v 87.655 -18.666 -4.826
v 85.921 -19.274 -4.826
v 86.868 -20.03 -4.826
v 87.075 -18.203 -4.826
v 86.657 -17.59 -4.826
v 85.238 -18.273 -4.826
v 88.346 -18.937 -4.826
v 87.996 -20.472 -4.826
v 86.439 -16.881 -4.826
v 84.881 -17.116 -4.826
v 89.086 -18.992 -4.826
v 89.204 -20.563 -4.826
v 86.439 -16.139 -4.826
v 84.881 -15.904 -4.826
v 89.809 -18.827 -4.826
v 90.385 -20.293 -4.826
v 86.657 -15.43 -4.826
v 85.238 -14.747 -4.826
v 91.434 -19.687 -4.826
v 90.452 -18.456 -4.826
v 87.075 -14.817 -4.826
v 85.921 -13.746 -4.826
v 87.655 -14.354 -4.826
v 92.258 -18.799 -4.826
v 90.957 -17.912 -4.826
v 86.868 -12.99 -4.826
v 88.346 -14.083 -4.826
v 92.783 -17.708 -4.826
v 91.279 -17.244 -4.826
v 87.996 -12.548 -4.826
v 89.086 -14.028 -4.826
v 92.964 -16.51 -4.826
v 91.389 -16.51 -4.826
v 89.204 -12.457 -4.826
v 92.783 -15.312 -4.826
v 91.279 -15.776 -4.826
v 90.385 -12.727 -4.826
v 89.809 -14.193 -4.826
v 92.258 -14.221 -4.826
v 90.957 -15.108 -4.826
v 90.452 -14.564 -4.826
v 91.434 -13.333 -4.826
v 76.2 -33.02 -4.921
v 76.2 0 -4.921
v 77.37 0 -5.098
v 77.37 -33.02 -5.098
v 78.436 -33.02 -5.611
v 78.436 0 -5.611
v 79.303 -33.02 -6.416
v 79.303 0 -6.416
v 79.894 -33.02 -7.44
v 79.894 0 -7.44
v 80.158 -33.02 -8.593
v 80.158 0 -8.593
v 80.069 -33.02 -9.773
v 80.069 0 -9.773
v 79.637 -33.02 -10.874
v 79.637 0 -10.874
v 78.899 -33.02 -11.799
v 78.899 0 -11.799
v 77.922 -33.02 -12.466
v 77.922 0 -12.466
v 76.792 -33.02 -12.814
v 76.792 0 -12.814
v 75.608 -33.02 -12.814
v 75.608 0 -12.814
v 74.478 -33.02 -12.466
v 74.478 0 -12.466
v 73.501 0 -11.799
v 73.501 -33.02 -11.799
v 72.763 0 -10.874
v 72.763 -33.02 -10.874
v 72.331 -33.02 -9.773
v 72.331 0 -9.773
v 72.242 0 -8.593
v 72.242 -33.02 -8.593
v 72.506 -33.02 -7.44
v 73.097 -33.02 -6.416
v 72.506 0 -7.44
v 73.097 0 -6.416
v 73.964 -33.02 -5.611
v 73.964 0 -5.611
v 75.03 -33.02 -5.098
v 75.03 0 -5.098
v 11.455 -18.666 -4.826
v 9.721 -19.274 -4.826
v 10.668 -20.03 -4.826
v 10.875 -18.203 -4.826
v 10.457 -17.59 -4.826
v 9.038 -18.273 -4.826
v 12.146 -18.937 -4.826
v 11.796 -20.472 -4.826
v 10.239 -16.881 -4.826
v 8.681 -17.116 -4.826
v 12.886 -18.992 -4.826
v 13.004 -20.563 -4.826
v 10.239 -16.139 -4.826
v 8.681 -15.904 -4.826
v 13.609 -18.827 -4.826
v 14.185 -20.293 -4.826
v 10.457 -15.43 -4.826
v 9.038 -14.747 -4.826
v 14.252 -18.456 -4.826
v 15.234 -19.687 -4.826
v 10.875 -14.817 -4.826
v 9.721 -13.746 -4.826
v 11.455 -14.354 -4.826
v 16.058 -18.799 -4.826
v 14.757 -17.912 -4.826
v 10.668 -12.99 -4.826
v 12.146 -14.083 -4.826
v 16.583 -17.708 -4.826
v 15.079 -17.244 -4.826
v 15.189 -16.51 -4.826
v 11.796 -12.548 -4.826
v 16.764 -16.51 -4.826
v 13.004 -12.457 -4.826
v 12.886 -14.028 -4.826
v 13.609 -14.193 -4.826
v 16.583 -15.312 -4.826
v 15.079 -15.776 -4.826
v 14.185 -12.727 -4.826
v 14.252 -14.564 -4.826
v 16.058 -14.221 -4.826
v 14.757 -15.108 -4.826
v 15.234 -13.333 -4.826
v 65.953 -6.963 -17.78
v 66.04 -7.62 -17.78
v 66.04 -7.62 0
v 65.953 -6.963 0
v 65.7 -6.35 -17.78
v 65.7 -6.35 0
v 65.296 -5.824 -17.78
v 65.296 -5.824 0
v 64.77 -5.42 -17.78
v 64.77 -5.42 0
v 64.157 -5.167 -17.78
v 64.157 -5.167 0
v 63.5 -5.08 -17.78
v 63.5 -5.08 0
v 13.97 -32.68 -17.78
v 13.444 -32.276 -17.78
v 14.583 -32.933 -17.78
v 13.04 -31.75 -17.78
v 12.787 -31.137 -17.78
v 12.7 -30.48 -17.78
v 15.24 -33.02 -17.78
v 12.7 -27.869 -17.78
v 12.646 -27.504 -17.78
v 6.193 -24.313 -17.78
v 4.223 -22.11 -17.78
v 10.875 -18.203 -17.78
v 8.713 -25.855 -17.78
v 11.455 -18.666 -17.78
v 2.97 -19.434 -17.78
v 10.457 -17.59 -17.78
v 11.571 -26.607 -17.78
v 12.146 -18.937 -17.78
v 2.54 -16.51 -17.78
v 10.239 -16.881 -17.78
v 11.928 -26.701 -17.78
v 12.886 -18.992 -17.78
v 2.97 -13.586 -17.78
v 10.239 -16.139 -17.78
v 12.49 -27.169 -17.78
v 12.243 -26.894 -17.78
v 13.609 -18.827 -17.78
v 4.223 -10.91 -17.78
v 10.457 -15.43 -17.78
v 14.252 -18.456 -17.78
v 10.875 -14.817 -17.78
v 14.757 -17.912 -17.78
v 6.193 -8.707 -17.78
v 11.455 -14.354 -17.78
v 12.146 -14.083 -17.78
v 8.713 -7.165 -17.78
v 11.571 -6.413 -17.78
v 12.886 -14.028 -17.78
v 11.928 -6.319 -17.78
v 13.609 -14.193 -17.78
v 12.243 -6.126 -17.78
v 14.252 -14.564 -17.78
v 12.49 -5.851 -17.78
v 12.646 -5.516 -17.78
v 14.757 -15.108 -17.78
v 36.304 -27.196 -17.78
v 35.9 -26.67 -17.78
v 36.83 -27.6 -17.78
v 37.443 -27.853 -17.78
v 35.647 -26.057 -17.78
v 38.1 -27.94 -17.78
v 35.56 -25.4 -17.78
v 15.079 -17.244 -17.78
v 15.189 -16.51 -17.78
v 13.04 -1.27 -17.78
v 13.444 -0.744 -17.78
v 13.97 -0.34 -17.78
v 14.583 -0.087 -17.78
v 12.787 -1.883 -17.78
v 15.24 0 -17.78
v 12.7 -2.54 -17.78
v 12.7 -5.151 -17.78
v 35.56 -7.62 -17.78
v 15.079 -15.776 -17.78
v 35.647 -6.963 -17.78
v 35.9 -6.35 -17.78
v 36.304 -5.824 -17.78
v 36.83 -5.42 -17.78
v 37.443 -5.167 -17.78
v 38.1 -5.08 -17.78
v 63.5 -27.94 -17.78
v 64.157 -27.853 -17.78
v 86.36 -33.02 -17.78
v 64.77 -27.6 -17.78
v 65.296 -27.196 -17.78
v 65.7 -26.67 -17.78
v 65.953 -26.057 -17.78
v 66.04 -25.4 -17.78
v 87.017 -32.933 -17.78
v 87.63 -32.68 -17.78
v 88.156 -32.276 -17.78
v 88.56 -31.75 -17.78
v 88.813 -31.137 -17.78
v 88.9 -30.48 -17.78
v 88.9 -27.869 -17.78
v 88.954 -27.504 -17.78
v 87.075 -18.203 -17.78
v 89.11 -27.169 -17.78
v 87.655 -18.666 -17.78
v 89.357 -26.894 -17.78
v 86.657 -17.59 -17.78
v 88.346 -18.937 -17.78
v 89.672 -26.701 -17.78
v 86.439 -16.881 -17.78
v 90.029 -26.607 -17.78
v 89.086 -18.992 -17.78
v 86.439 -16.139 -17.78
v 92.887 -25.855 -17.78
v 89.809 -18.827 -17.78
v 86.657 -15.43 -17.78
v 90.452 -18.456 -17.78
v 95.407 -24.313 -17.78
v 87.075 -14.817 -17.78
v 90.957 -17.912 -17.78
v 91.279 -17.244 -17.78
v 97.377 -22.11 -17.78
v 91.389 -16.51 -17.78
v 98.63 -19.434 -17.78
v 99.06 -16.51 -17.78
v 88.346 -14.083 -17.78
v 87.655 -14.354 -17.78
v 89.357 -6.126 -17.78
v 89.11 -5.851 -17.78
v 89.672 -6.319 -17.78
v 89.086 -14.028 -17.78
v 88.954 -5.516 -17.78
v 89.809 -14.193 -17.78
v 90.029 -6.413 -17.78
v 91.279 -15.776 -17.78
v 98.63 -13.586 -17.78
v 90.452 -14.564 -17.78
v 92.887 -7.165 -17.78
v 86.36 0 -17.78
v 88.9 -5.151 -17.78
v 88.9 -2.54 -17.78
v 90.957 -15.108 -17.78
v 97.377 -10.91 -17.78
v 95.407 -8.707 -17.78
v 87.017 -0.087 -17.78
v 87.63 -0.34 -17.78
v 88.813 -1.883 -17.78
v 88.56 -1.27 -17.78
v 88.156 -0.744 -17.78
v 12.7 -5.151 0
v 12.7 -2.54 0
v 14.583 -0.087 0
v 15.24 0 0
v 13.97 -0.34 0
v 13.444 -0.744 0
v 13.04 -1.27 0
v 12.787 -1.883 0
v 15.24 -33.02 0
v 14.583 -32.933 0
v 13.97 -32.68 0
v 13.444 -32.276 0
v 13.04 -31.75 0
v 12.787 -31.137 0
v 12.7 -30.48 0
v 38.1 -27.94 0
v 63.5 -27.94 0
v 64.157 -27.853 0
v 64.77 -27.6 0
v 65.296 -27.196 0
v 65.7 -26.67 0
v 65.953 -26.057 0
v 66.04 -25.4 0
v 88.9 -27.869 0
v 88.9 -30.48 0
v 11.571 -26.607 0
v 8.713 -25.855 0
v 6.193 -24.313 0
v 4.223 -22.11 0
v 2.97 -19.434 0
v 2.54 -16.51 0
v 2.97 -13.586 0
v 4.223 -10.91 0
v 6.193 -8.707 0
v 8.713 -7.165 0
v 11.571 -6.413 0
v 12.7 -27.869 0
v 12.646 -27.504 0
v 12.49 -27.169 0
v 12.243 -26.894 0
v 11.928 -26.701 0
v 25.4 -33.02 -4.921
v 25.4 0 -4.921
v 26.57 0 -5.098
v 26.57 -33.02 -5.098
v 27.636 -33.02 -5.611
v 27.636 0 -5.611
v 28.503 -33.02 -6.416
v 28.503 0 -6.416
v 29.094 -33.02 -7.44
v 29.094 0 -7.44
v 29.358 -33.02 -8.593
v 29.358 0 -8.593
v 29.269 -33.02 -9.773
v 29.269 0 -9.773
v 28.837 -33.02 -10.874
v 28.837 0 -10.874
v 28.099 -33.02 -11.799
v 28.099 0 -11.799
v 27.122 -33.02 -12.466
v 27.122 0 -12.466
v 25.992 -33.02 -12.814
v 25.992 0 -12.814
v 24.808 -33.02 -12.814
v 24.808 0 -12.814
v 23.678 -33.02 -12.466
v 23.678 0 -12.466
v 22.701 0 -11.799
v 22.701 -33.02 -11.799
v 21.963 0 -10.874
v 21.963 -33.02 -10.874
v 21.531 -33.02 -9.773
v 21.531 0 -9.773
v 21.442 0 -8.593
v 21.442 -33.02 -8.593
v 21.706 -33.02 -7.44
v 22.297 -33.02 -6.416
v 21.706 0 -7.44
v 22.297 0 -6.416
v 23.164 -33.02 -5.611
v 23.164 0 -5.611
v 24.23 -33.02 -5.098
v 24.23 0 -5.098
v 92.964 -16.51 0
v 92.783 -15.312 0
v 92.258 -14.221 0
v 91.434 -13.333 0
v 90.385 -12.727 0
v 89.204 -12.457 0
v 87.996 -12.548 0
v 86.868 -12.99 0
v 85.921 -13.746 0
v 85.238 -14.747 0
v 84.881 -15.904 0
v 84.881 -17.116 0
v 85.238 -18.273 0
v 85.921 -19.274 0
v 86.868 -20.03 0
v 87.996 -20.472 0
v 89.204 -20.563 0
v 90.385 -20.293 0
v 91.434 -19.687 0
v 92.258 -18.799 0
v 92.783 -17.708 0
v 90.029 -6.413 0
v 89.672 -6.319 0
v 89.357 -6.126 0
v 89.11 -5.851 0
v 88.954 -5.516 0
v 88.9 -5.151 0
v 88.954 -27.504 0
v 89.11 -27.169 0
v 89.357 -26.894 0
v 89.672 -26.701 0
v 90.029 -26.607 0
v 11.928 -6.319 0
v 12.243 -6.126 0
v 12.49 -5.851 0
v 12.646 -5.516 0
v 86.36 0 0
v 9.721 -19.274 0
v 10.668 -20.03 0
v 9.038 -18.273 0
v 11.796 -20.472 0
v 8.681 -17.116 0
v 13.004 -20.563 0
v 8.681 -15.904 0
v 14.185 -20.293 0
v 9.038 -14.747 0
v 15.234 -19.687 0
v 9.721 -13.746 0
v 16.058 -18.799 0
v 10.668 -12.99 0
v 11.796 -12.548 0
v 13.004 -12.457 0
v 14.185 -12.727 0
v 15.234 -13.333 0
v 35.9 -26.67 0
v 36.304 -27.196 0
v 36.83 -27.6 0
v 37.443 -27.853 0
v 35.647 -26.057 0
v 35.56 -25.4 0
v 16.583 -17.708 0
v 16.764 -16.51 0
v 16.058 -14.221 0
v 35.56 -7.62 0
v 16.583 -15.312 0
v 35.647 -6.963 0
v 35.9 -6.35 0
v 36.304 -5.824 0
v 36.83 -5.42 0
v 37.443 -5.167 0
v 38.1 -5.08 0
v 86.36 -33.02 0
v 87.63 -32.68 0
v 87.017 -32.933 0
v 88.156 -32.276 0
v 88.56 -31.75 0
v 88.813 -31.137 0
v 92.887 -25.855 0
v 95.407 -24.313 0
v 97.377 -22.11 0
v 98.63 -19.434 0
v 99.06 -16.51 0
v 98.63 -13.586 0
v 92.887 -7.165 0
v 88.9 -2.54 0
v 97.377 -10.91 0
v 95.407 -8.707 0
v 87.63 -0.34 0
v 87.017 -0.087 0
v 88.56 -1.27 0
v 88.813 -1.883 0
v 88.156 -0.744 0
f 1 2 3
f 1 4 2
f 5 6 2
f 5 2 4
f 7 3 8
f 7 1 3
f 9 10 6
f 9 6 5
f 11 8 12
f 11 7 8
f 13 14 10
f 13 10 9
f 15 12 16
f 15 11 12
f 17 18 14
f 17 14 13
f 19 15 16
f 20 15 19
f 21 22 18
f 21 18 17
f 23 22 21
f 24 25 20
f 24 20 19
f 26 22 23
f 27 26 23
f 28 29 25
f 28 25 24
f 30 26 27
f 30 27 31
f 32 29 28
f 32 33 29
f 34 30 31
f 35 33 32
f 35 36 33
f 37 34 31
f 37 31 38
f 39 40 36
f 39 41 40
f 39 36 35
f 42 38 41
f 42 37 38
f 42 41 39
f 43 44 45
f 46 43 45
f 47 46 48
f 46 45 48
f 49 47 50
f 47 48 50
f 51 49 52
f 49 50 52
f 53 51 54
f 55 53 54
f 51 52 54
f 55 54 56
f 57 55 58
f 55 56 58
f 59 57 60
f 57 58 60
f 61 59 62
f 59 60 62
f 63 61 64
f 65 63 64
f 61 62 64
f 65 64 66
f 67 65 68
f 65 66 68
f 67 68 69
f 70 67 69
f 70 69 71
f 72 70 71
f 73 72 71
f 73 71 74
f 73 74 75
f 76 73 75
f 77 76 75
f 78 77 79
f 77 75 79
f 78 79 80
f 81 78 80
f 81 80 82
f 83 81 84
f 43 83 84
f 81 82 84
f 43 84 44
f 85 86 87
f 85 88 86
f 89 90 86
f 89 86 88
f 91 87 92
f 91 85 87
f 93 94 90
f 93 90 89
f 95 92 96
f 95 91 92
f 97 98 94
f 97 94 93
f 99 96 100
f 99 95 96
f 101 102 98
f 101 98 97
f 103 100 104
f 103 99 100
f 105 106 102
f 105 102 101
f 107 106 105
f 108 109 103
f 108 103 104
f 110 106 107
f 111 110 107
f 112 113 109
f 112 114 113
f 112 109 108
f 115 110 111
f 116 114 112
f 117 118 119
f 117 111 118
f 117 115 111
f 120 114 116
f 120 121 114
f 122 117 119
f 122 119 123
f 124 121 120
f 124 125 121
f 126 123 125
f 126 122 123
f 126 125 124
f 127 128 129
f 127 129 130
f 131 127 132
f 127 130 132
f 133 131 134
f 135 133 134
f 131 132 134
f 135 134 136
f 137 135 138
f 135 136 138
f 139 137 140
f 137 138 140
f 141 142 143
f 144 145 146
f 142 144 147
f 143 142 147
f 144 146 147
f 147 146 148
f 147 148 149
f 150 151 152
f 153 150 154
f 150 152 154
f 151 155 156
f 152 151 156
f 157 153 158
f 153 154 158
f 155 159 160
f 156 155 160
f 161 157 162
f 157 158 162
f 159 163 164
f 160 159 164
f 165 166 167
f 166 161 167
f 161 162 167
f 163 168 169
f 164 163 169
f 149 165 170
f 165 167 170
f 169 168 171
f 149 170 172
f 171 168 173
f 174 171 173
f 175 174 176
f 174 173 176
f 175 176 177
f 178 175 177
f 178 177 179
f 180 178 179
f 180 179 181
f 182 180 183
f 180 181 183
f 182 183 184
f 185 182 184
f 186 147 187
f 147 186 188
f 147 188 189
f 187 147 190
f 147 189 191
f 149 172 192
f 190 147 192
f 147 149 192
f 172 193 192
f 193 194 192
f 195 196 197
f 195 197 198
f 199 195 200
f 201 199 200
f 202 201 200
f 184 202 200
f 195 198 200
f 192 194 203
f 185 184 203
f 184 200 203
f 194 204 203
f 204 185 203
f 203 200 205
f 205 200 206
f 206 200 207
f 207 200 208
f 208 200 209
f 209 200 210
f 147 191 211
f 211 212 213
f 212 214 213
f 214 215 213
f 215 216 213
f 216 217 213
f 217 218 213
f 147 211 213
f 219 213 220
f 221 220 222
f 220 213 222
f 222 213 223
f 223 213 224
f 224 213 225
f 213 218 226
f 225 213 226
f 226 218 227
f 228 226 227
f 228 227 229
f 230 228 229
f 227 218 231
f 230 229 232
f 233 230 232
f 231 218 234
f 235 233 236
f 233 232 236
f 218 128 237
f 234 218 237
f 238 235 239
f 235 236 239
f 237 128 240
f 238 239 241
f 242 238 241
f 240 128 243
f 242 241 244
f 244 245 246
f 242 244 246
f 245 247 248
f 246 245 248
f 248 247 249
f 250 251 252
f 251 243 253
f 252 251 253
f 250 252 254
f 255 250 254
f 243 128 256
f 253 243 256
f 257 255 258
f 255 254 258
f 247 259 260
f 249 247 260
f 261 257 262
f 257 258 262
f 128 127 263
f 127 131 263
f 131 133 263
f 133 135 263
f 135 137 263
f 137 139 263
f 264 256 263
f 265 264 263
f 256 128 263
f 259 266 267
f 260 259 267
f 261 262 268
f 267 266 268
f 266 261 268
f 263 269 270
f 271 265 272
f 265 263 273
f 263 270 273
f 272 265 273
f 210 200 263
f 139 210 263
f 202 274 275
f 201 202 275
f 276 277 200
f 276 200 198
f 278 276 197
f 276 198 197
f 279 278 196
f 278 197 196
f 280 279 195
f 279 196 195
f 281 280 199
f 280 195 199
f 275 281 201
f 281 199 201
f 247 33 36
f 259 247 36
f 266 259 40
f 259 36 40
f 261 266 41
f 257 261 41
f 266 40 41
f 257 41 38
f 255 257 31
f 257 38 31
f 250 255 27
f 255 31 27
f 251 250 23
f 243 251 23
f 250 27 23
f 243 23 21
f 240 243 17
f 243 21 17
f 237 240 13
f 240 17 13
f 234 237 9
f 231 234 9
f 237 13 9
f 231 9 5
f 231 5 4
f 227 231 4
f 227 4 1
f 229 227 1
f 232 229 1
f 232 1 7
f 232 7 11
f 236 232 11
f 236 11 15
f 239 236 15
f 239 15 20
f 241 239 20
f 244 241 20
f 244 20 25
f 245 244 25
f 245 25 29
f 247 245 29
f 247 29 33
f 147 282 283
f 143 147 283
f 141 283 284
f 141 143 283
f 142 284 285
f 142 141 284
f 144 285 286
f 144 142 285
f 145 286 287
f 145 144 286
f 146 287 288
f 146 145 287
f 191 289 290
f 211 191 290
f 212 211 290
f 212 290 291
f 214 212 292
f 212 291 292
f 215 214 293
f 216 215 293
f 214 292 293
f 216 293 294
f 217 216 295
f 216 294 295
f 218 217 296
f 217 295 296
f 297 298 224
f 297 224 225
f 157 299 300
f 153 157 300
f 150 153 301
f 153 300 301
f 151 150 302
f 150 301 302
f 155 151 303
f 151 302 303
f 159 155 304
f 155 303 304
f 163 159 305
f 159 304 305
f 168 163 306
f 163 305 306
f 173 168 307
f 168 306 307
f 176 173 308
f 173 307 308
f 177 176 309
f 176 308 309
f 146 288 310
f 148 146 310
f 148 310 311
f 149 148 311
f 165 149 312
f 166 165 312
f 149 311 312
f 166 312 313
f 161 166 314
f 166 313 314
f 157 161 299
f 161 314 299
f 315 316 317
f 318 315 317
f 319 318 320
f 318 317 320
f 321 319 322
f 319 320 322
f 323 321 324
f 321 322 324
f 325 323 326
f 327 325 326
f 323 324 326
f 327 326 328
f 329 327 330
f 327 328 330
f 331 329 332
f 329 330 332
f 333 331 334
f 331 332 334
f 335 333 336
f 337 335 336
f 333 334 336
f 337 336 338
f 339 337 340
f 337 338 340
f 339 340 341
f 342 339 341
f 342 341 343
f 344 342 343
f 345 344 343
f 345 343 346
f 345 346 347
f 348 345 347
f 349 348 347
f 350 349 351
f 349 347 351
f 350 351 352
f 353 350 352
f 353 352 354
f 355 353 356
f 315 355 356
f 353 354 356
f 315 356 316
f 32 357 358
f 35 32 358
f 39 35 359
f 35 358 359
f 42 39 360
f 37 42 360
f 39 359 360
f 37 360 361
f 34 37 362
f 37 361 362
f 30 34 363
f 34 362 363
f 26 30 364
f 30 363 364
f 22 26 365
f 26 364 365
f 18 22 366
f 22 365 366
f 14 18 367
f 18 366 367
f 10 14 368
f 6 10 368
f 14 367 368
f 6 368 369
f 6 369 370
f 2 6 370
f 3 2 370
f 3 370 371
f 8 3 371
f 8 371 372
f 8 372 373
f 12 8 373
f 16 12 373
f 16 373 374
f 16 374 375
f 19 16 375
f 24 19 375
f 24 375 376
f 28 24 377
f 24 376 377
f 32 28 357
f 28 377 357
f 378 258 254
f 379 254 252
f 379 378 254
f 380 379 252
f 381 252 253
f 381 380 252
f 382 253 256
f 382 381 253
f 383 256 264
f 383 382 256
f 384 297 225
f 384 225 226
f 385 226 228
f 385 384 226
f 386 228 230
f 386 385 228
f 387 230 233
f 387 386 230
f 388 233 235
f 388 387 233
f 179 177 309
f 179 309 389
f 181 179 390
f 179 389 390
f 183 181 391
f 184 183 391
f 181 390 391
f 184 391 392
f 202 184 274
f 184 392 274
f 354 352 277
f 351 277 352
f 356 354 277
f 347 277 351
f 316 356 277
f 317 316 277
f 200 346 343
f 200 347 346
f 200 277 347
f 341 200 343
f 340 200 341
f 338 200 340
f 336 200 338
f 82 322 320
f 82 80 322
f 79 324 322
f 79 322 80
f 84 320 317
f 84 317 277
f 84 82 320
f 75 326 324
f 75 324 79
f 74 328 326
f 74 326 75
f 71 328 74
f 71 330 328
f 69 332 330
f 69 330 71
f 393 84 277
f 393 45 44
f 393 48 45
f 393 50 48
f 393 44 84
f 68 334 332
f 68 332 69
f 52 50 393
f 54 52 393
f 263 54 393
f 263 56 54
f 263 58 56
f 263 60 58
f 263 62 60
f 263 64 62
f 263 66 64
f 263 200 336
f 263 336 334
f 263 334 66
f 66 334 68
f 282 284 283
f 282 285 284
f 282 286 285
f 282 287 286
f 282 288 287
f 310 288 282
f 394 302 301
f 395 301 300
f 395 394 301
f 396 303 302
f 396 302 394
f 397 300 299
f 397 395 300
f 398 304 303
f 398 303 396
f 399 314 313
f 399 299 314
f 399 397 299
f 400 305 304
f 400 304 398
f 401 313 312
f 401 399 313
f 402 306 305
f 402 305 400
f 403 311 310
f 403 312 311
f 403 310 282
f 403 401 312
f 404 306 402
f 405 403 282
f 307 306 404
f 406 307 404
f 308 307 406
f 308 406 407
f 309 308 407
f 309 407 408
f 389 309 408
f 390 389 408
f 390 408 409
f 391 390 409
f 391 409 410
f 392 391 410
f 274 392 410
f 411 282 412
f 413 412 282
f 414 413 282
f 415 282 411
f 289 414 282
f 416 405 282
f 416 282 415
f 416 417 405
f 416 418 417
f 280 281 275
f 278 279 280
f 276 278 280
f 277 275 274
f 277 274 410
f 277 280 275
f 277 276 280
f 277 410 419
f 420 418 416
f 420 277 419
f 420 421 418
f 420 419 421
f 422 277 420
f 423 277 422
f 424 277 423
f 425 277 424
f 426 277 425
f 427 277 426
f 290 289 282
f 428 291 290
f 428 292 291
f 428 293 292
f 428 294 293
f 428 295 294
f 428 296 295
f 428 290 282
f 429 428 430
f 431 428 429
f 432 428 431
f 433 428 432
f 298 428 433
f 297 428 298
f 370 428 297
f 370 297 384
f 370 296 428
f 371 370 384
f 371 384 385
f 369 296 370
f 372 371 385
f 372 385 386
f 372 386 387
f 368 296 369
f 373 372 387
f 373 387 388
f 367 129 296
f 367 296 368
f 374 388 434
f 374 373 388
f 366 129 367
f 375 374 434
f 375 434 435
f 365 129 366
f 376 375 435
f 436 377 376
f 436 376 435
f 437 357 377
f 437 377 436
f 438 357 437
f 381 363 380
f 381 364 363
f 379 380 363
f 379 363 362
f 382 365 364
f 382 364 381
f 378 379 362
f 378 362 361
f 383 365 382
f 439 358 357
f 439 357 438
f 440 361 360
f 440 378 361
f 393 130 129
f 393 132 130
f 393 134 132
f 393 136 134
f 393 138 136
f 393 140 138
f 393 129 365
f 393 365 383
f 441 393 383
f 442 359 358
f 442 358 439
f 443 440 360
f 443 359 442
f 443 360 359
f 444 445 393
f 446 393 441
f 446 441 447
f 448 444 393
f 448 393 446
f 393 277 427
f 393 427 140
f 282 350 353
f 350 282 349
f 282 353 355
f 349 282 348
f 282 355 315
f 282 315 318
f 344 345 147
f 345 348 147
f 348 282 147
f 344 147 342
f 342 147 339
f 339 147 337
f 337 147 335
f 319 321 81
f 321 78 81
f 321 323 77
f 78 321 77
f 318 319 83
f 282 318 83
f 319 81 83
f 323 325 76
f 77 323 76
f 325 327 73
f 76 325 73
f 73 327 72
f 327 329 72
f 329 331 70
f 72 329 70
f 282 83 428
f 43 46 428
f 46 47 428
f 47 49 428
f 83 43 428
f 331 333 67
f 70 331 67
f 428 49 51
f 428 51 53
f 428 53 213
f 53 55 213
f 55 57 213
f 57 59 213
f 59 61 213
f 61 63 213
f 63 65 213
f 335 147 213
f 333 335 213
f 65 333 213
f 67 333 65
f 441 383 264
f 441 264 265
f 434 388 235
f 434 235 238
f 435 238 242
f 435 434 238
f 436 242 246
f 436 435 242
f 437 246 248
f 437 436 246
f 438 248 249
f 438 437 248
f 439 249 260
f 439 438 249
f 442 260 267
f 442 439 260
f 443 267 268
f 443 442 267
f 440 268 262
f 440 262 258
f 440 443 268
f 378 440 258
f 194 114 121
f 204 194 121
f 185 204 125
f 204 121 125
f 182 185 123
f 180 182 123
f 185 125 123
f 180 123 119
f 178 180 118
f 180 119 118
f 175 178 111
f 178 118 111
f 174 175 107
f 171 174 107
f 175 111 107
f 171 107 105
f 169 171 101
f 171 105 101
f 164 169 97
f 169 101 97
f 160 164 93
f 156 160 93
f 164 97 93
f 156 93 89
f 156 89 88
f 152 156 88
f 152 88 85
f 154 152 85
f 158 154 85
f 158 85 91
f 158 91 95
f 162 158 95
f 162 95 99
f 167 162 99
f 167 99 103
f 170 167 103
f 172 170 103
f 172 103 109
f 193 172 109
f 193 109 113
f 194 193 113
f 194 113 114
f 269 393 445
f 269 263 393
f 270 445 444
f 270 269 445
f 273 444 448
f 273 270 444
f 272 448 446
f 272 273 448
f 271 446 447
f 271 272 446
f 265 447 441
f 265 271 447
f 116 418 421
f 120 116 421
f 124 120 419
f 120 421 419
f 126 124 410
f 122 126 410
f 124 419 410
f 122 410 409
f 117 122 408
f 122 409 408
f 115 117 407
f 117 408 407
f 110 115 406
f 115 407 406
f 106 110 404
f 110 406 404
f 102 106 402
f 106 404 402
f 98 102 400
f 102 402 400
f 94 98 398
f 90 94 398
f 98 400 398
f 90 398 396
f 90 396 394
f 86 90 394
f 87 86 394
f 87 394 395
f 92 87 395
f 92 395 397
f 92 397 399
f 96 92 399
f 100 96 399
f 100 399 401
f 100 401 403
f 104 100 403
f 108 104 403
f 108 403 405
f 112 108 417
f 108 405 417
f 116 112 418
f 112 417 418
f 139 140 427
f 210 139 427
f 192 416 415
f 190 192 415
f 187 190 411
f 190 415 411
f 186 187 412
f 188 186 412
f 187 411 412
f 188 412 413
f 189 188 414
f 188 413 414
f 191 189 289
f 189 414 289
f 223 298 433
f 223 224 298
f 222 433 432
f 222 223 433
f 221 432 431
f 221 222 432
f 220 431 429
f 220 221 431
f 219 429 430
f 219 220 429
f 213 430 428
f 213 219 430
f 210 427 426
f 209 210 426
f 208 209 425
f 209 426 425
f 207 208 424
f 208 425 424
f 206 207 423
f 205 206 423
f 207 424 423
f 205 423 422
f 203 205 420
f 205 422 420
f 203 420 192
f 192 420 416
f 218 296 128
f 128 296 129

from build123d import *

# Parameters (mm, degrees)
SKETCH1_W           = 101.6
SKETCH1_H           = 17.78
SKETCH1_R           = 3.96875
BOSS_EXTRUDE1_DEPTH = 33.02
SKETCH2_R           = 2.4892
CUT_EXTRUDE1_DEPTH  = 17.78
SKETCH3_R           = 4.064
CUT_EXTRUDE2_DEPTH  = 4.826
CUT_EXTRUDE3_DEPTH  = 109.300548475
FILLET1_R           = 2.54
CUT_EXTRUDE4_DEPTH  = 106.921350067


with BuildPart() as part:
    # Sketch1 → Boss-Extrude1 (new body)
    with BuildSketch(Plane(origin=(0, 0, 0), x_dir=(1, 0, 0), z_dir=(0, 1, 0))):
        with Locations((50.8, 8.89)):
            Rectangle(SKETCH1_W, SKETCH1_H)
        with Locations(Location((76.2, 8.89, 0), (0, 0, 270))):
            Circle(SKETCH1_R, mode=Mode.SUBTRACT)
        with Locations(Location((25.4, 8.89, 0), (0, 0, 270))):
            Circle(SKETCH1_R, mode=Mode.SUBTRACT)
    extrude(amount=-BOSS_EXTRUDE1_DEPTH)

    # Sketch2 → Cut-Extrude1 (cut)
    with BuildSketch(Plane.XY):
        with Locations((88.9, -16.51)):
            Circle(SKETCH2_R)
        with Locations((12.7, -16.51)):
            Circle(SKETCH2_R)
    extrude(amount=-CUT_EXTRUDE1_DEPTH, mode=Mode.SUBTRACT)

    # Sketch3 → Cut-Extrude2 (cut)
    with BuildSketch(Plane.XY):
        with Locations((88.9, -16.51)):
            Circle(SKETCH3_R)
        with Locations((12.7, -16.51)):
            Circle(SKETCH3_R)
    extrude(amount=-CUT_EXTRUDE2_DEPTH, mode=Mode.SUBTRACT)

    # Sketch5 → Cut-Extrude3 (cut, through all)
    with BuildSketch(Plane.XY):
        with BuildLine():
            Line((12.7, -5.150774674), (12.7, 0))
            Line((12.7, 0), (0, 0))
            Line((0, 0), (0, -33.02))
            Line((0, -33.02), (12.7, -33.02))
            Line((12.7, -33.02), (12.7, -27.869225326))
            ThreePointArc((12.7, -27.869225326), (12.37660211, -27.022558659), (11.571111111, -26.607089178))
            ThreePointArc((11.571111111, -26.607089178), (2.54, -16.51), (11.571111111, -6.412910822))
            ThreePointArc((11.571111111, -6.412910822), (12.37660211, -5.997441341), (12.7, -5.150774674))
        make_face()
        with BuildLine():
            Line((88.9, -5.150774674), (88.9, 0))
            Line((88.9, 0), (101.6, 0))
            Line((101.6, 0), (101.6, -33.02))
            Line((101.6, -33.02), (88.9, -33.02))
            Line((88.9, -33.02), (88.9, -27.869225326))
            ThreePointArc((88.9, -27.869225326), (89.22339789, -27.022558659), (90.028888889, -26.607089178))
            ThreePointArc((90.028888889, -26.607089178), (99.06, -16.51), (90.028888889, -6.412910822))
            ThreePointArc((90.028888889, -6.412910822), (89.22339789, -5.997441341), (88.9, -5.150774674))
        make_face()
    extrude(amount=-CUT_EXTRUDE3_DEPTH, mode=Mode.SUBTRACT)

    # Fillet1
    fillet1_edges = [part.edges().sort_by_distance(p)[0] for p in [
        (12.7, -33.02, -8.89),
        (12.7, 0, -8.89),
        (88.9, 0, -8.89),
        (88.9, -33.02, -8.89),
    ]]
    fillet(fillet1_edges, radius=FILLET1_R)

    # Sketch6 → Cut-Extrude4 (cut, through all)
    with BuildSketch(Plane.XY):
        with BuildLine():
            Line((38.1, -27.94), (63.5, -27.94))
            ThreePointArc((63.5, -27.94), (65.296051224, -27.196051224), (66.04, -25.4))
            Line((66.04, -25.4), (66.04, -7.62))
            ThreePointArc((66.04, -7.62), (65.296051224, -5.823948776), (63.5, -5.08))
            Line((63.5, -5.08), (38.1, -5.08))
            ThreePointArc((38.1, -5.08), (36.303948776, -5.823948776), (35.56, -7.62))
            Line((35.56, -7.62), (35.56, -25.4))
            ThreePointArc((35.56, -25.4), (36.303948776, -27.196051224), (38.1, -27.94))
        make_face()
    extrude(amount=-CUT_EXTRUDE4_DEPTH, mode=Mode.SUBTRACT)


solid = part.part
